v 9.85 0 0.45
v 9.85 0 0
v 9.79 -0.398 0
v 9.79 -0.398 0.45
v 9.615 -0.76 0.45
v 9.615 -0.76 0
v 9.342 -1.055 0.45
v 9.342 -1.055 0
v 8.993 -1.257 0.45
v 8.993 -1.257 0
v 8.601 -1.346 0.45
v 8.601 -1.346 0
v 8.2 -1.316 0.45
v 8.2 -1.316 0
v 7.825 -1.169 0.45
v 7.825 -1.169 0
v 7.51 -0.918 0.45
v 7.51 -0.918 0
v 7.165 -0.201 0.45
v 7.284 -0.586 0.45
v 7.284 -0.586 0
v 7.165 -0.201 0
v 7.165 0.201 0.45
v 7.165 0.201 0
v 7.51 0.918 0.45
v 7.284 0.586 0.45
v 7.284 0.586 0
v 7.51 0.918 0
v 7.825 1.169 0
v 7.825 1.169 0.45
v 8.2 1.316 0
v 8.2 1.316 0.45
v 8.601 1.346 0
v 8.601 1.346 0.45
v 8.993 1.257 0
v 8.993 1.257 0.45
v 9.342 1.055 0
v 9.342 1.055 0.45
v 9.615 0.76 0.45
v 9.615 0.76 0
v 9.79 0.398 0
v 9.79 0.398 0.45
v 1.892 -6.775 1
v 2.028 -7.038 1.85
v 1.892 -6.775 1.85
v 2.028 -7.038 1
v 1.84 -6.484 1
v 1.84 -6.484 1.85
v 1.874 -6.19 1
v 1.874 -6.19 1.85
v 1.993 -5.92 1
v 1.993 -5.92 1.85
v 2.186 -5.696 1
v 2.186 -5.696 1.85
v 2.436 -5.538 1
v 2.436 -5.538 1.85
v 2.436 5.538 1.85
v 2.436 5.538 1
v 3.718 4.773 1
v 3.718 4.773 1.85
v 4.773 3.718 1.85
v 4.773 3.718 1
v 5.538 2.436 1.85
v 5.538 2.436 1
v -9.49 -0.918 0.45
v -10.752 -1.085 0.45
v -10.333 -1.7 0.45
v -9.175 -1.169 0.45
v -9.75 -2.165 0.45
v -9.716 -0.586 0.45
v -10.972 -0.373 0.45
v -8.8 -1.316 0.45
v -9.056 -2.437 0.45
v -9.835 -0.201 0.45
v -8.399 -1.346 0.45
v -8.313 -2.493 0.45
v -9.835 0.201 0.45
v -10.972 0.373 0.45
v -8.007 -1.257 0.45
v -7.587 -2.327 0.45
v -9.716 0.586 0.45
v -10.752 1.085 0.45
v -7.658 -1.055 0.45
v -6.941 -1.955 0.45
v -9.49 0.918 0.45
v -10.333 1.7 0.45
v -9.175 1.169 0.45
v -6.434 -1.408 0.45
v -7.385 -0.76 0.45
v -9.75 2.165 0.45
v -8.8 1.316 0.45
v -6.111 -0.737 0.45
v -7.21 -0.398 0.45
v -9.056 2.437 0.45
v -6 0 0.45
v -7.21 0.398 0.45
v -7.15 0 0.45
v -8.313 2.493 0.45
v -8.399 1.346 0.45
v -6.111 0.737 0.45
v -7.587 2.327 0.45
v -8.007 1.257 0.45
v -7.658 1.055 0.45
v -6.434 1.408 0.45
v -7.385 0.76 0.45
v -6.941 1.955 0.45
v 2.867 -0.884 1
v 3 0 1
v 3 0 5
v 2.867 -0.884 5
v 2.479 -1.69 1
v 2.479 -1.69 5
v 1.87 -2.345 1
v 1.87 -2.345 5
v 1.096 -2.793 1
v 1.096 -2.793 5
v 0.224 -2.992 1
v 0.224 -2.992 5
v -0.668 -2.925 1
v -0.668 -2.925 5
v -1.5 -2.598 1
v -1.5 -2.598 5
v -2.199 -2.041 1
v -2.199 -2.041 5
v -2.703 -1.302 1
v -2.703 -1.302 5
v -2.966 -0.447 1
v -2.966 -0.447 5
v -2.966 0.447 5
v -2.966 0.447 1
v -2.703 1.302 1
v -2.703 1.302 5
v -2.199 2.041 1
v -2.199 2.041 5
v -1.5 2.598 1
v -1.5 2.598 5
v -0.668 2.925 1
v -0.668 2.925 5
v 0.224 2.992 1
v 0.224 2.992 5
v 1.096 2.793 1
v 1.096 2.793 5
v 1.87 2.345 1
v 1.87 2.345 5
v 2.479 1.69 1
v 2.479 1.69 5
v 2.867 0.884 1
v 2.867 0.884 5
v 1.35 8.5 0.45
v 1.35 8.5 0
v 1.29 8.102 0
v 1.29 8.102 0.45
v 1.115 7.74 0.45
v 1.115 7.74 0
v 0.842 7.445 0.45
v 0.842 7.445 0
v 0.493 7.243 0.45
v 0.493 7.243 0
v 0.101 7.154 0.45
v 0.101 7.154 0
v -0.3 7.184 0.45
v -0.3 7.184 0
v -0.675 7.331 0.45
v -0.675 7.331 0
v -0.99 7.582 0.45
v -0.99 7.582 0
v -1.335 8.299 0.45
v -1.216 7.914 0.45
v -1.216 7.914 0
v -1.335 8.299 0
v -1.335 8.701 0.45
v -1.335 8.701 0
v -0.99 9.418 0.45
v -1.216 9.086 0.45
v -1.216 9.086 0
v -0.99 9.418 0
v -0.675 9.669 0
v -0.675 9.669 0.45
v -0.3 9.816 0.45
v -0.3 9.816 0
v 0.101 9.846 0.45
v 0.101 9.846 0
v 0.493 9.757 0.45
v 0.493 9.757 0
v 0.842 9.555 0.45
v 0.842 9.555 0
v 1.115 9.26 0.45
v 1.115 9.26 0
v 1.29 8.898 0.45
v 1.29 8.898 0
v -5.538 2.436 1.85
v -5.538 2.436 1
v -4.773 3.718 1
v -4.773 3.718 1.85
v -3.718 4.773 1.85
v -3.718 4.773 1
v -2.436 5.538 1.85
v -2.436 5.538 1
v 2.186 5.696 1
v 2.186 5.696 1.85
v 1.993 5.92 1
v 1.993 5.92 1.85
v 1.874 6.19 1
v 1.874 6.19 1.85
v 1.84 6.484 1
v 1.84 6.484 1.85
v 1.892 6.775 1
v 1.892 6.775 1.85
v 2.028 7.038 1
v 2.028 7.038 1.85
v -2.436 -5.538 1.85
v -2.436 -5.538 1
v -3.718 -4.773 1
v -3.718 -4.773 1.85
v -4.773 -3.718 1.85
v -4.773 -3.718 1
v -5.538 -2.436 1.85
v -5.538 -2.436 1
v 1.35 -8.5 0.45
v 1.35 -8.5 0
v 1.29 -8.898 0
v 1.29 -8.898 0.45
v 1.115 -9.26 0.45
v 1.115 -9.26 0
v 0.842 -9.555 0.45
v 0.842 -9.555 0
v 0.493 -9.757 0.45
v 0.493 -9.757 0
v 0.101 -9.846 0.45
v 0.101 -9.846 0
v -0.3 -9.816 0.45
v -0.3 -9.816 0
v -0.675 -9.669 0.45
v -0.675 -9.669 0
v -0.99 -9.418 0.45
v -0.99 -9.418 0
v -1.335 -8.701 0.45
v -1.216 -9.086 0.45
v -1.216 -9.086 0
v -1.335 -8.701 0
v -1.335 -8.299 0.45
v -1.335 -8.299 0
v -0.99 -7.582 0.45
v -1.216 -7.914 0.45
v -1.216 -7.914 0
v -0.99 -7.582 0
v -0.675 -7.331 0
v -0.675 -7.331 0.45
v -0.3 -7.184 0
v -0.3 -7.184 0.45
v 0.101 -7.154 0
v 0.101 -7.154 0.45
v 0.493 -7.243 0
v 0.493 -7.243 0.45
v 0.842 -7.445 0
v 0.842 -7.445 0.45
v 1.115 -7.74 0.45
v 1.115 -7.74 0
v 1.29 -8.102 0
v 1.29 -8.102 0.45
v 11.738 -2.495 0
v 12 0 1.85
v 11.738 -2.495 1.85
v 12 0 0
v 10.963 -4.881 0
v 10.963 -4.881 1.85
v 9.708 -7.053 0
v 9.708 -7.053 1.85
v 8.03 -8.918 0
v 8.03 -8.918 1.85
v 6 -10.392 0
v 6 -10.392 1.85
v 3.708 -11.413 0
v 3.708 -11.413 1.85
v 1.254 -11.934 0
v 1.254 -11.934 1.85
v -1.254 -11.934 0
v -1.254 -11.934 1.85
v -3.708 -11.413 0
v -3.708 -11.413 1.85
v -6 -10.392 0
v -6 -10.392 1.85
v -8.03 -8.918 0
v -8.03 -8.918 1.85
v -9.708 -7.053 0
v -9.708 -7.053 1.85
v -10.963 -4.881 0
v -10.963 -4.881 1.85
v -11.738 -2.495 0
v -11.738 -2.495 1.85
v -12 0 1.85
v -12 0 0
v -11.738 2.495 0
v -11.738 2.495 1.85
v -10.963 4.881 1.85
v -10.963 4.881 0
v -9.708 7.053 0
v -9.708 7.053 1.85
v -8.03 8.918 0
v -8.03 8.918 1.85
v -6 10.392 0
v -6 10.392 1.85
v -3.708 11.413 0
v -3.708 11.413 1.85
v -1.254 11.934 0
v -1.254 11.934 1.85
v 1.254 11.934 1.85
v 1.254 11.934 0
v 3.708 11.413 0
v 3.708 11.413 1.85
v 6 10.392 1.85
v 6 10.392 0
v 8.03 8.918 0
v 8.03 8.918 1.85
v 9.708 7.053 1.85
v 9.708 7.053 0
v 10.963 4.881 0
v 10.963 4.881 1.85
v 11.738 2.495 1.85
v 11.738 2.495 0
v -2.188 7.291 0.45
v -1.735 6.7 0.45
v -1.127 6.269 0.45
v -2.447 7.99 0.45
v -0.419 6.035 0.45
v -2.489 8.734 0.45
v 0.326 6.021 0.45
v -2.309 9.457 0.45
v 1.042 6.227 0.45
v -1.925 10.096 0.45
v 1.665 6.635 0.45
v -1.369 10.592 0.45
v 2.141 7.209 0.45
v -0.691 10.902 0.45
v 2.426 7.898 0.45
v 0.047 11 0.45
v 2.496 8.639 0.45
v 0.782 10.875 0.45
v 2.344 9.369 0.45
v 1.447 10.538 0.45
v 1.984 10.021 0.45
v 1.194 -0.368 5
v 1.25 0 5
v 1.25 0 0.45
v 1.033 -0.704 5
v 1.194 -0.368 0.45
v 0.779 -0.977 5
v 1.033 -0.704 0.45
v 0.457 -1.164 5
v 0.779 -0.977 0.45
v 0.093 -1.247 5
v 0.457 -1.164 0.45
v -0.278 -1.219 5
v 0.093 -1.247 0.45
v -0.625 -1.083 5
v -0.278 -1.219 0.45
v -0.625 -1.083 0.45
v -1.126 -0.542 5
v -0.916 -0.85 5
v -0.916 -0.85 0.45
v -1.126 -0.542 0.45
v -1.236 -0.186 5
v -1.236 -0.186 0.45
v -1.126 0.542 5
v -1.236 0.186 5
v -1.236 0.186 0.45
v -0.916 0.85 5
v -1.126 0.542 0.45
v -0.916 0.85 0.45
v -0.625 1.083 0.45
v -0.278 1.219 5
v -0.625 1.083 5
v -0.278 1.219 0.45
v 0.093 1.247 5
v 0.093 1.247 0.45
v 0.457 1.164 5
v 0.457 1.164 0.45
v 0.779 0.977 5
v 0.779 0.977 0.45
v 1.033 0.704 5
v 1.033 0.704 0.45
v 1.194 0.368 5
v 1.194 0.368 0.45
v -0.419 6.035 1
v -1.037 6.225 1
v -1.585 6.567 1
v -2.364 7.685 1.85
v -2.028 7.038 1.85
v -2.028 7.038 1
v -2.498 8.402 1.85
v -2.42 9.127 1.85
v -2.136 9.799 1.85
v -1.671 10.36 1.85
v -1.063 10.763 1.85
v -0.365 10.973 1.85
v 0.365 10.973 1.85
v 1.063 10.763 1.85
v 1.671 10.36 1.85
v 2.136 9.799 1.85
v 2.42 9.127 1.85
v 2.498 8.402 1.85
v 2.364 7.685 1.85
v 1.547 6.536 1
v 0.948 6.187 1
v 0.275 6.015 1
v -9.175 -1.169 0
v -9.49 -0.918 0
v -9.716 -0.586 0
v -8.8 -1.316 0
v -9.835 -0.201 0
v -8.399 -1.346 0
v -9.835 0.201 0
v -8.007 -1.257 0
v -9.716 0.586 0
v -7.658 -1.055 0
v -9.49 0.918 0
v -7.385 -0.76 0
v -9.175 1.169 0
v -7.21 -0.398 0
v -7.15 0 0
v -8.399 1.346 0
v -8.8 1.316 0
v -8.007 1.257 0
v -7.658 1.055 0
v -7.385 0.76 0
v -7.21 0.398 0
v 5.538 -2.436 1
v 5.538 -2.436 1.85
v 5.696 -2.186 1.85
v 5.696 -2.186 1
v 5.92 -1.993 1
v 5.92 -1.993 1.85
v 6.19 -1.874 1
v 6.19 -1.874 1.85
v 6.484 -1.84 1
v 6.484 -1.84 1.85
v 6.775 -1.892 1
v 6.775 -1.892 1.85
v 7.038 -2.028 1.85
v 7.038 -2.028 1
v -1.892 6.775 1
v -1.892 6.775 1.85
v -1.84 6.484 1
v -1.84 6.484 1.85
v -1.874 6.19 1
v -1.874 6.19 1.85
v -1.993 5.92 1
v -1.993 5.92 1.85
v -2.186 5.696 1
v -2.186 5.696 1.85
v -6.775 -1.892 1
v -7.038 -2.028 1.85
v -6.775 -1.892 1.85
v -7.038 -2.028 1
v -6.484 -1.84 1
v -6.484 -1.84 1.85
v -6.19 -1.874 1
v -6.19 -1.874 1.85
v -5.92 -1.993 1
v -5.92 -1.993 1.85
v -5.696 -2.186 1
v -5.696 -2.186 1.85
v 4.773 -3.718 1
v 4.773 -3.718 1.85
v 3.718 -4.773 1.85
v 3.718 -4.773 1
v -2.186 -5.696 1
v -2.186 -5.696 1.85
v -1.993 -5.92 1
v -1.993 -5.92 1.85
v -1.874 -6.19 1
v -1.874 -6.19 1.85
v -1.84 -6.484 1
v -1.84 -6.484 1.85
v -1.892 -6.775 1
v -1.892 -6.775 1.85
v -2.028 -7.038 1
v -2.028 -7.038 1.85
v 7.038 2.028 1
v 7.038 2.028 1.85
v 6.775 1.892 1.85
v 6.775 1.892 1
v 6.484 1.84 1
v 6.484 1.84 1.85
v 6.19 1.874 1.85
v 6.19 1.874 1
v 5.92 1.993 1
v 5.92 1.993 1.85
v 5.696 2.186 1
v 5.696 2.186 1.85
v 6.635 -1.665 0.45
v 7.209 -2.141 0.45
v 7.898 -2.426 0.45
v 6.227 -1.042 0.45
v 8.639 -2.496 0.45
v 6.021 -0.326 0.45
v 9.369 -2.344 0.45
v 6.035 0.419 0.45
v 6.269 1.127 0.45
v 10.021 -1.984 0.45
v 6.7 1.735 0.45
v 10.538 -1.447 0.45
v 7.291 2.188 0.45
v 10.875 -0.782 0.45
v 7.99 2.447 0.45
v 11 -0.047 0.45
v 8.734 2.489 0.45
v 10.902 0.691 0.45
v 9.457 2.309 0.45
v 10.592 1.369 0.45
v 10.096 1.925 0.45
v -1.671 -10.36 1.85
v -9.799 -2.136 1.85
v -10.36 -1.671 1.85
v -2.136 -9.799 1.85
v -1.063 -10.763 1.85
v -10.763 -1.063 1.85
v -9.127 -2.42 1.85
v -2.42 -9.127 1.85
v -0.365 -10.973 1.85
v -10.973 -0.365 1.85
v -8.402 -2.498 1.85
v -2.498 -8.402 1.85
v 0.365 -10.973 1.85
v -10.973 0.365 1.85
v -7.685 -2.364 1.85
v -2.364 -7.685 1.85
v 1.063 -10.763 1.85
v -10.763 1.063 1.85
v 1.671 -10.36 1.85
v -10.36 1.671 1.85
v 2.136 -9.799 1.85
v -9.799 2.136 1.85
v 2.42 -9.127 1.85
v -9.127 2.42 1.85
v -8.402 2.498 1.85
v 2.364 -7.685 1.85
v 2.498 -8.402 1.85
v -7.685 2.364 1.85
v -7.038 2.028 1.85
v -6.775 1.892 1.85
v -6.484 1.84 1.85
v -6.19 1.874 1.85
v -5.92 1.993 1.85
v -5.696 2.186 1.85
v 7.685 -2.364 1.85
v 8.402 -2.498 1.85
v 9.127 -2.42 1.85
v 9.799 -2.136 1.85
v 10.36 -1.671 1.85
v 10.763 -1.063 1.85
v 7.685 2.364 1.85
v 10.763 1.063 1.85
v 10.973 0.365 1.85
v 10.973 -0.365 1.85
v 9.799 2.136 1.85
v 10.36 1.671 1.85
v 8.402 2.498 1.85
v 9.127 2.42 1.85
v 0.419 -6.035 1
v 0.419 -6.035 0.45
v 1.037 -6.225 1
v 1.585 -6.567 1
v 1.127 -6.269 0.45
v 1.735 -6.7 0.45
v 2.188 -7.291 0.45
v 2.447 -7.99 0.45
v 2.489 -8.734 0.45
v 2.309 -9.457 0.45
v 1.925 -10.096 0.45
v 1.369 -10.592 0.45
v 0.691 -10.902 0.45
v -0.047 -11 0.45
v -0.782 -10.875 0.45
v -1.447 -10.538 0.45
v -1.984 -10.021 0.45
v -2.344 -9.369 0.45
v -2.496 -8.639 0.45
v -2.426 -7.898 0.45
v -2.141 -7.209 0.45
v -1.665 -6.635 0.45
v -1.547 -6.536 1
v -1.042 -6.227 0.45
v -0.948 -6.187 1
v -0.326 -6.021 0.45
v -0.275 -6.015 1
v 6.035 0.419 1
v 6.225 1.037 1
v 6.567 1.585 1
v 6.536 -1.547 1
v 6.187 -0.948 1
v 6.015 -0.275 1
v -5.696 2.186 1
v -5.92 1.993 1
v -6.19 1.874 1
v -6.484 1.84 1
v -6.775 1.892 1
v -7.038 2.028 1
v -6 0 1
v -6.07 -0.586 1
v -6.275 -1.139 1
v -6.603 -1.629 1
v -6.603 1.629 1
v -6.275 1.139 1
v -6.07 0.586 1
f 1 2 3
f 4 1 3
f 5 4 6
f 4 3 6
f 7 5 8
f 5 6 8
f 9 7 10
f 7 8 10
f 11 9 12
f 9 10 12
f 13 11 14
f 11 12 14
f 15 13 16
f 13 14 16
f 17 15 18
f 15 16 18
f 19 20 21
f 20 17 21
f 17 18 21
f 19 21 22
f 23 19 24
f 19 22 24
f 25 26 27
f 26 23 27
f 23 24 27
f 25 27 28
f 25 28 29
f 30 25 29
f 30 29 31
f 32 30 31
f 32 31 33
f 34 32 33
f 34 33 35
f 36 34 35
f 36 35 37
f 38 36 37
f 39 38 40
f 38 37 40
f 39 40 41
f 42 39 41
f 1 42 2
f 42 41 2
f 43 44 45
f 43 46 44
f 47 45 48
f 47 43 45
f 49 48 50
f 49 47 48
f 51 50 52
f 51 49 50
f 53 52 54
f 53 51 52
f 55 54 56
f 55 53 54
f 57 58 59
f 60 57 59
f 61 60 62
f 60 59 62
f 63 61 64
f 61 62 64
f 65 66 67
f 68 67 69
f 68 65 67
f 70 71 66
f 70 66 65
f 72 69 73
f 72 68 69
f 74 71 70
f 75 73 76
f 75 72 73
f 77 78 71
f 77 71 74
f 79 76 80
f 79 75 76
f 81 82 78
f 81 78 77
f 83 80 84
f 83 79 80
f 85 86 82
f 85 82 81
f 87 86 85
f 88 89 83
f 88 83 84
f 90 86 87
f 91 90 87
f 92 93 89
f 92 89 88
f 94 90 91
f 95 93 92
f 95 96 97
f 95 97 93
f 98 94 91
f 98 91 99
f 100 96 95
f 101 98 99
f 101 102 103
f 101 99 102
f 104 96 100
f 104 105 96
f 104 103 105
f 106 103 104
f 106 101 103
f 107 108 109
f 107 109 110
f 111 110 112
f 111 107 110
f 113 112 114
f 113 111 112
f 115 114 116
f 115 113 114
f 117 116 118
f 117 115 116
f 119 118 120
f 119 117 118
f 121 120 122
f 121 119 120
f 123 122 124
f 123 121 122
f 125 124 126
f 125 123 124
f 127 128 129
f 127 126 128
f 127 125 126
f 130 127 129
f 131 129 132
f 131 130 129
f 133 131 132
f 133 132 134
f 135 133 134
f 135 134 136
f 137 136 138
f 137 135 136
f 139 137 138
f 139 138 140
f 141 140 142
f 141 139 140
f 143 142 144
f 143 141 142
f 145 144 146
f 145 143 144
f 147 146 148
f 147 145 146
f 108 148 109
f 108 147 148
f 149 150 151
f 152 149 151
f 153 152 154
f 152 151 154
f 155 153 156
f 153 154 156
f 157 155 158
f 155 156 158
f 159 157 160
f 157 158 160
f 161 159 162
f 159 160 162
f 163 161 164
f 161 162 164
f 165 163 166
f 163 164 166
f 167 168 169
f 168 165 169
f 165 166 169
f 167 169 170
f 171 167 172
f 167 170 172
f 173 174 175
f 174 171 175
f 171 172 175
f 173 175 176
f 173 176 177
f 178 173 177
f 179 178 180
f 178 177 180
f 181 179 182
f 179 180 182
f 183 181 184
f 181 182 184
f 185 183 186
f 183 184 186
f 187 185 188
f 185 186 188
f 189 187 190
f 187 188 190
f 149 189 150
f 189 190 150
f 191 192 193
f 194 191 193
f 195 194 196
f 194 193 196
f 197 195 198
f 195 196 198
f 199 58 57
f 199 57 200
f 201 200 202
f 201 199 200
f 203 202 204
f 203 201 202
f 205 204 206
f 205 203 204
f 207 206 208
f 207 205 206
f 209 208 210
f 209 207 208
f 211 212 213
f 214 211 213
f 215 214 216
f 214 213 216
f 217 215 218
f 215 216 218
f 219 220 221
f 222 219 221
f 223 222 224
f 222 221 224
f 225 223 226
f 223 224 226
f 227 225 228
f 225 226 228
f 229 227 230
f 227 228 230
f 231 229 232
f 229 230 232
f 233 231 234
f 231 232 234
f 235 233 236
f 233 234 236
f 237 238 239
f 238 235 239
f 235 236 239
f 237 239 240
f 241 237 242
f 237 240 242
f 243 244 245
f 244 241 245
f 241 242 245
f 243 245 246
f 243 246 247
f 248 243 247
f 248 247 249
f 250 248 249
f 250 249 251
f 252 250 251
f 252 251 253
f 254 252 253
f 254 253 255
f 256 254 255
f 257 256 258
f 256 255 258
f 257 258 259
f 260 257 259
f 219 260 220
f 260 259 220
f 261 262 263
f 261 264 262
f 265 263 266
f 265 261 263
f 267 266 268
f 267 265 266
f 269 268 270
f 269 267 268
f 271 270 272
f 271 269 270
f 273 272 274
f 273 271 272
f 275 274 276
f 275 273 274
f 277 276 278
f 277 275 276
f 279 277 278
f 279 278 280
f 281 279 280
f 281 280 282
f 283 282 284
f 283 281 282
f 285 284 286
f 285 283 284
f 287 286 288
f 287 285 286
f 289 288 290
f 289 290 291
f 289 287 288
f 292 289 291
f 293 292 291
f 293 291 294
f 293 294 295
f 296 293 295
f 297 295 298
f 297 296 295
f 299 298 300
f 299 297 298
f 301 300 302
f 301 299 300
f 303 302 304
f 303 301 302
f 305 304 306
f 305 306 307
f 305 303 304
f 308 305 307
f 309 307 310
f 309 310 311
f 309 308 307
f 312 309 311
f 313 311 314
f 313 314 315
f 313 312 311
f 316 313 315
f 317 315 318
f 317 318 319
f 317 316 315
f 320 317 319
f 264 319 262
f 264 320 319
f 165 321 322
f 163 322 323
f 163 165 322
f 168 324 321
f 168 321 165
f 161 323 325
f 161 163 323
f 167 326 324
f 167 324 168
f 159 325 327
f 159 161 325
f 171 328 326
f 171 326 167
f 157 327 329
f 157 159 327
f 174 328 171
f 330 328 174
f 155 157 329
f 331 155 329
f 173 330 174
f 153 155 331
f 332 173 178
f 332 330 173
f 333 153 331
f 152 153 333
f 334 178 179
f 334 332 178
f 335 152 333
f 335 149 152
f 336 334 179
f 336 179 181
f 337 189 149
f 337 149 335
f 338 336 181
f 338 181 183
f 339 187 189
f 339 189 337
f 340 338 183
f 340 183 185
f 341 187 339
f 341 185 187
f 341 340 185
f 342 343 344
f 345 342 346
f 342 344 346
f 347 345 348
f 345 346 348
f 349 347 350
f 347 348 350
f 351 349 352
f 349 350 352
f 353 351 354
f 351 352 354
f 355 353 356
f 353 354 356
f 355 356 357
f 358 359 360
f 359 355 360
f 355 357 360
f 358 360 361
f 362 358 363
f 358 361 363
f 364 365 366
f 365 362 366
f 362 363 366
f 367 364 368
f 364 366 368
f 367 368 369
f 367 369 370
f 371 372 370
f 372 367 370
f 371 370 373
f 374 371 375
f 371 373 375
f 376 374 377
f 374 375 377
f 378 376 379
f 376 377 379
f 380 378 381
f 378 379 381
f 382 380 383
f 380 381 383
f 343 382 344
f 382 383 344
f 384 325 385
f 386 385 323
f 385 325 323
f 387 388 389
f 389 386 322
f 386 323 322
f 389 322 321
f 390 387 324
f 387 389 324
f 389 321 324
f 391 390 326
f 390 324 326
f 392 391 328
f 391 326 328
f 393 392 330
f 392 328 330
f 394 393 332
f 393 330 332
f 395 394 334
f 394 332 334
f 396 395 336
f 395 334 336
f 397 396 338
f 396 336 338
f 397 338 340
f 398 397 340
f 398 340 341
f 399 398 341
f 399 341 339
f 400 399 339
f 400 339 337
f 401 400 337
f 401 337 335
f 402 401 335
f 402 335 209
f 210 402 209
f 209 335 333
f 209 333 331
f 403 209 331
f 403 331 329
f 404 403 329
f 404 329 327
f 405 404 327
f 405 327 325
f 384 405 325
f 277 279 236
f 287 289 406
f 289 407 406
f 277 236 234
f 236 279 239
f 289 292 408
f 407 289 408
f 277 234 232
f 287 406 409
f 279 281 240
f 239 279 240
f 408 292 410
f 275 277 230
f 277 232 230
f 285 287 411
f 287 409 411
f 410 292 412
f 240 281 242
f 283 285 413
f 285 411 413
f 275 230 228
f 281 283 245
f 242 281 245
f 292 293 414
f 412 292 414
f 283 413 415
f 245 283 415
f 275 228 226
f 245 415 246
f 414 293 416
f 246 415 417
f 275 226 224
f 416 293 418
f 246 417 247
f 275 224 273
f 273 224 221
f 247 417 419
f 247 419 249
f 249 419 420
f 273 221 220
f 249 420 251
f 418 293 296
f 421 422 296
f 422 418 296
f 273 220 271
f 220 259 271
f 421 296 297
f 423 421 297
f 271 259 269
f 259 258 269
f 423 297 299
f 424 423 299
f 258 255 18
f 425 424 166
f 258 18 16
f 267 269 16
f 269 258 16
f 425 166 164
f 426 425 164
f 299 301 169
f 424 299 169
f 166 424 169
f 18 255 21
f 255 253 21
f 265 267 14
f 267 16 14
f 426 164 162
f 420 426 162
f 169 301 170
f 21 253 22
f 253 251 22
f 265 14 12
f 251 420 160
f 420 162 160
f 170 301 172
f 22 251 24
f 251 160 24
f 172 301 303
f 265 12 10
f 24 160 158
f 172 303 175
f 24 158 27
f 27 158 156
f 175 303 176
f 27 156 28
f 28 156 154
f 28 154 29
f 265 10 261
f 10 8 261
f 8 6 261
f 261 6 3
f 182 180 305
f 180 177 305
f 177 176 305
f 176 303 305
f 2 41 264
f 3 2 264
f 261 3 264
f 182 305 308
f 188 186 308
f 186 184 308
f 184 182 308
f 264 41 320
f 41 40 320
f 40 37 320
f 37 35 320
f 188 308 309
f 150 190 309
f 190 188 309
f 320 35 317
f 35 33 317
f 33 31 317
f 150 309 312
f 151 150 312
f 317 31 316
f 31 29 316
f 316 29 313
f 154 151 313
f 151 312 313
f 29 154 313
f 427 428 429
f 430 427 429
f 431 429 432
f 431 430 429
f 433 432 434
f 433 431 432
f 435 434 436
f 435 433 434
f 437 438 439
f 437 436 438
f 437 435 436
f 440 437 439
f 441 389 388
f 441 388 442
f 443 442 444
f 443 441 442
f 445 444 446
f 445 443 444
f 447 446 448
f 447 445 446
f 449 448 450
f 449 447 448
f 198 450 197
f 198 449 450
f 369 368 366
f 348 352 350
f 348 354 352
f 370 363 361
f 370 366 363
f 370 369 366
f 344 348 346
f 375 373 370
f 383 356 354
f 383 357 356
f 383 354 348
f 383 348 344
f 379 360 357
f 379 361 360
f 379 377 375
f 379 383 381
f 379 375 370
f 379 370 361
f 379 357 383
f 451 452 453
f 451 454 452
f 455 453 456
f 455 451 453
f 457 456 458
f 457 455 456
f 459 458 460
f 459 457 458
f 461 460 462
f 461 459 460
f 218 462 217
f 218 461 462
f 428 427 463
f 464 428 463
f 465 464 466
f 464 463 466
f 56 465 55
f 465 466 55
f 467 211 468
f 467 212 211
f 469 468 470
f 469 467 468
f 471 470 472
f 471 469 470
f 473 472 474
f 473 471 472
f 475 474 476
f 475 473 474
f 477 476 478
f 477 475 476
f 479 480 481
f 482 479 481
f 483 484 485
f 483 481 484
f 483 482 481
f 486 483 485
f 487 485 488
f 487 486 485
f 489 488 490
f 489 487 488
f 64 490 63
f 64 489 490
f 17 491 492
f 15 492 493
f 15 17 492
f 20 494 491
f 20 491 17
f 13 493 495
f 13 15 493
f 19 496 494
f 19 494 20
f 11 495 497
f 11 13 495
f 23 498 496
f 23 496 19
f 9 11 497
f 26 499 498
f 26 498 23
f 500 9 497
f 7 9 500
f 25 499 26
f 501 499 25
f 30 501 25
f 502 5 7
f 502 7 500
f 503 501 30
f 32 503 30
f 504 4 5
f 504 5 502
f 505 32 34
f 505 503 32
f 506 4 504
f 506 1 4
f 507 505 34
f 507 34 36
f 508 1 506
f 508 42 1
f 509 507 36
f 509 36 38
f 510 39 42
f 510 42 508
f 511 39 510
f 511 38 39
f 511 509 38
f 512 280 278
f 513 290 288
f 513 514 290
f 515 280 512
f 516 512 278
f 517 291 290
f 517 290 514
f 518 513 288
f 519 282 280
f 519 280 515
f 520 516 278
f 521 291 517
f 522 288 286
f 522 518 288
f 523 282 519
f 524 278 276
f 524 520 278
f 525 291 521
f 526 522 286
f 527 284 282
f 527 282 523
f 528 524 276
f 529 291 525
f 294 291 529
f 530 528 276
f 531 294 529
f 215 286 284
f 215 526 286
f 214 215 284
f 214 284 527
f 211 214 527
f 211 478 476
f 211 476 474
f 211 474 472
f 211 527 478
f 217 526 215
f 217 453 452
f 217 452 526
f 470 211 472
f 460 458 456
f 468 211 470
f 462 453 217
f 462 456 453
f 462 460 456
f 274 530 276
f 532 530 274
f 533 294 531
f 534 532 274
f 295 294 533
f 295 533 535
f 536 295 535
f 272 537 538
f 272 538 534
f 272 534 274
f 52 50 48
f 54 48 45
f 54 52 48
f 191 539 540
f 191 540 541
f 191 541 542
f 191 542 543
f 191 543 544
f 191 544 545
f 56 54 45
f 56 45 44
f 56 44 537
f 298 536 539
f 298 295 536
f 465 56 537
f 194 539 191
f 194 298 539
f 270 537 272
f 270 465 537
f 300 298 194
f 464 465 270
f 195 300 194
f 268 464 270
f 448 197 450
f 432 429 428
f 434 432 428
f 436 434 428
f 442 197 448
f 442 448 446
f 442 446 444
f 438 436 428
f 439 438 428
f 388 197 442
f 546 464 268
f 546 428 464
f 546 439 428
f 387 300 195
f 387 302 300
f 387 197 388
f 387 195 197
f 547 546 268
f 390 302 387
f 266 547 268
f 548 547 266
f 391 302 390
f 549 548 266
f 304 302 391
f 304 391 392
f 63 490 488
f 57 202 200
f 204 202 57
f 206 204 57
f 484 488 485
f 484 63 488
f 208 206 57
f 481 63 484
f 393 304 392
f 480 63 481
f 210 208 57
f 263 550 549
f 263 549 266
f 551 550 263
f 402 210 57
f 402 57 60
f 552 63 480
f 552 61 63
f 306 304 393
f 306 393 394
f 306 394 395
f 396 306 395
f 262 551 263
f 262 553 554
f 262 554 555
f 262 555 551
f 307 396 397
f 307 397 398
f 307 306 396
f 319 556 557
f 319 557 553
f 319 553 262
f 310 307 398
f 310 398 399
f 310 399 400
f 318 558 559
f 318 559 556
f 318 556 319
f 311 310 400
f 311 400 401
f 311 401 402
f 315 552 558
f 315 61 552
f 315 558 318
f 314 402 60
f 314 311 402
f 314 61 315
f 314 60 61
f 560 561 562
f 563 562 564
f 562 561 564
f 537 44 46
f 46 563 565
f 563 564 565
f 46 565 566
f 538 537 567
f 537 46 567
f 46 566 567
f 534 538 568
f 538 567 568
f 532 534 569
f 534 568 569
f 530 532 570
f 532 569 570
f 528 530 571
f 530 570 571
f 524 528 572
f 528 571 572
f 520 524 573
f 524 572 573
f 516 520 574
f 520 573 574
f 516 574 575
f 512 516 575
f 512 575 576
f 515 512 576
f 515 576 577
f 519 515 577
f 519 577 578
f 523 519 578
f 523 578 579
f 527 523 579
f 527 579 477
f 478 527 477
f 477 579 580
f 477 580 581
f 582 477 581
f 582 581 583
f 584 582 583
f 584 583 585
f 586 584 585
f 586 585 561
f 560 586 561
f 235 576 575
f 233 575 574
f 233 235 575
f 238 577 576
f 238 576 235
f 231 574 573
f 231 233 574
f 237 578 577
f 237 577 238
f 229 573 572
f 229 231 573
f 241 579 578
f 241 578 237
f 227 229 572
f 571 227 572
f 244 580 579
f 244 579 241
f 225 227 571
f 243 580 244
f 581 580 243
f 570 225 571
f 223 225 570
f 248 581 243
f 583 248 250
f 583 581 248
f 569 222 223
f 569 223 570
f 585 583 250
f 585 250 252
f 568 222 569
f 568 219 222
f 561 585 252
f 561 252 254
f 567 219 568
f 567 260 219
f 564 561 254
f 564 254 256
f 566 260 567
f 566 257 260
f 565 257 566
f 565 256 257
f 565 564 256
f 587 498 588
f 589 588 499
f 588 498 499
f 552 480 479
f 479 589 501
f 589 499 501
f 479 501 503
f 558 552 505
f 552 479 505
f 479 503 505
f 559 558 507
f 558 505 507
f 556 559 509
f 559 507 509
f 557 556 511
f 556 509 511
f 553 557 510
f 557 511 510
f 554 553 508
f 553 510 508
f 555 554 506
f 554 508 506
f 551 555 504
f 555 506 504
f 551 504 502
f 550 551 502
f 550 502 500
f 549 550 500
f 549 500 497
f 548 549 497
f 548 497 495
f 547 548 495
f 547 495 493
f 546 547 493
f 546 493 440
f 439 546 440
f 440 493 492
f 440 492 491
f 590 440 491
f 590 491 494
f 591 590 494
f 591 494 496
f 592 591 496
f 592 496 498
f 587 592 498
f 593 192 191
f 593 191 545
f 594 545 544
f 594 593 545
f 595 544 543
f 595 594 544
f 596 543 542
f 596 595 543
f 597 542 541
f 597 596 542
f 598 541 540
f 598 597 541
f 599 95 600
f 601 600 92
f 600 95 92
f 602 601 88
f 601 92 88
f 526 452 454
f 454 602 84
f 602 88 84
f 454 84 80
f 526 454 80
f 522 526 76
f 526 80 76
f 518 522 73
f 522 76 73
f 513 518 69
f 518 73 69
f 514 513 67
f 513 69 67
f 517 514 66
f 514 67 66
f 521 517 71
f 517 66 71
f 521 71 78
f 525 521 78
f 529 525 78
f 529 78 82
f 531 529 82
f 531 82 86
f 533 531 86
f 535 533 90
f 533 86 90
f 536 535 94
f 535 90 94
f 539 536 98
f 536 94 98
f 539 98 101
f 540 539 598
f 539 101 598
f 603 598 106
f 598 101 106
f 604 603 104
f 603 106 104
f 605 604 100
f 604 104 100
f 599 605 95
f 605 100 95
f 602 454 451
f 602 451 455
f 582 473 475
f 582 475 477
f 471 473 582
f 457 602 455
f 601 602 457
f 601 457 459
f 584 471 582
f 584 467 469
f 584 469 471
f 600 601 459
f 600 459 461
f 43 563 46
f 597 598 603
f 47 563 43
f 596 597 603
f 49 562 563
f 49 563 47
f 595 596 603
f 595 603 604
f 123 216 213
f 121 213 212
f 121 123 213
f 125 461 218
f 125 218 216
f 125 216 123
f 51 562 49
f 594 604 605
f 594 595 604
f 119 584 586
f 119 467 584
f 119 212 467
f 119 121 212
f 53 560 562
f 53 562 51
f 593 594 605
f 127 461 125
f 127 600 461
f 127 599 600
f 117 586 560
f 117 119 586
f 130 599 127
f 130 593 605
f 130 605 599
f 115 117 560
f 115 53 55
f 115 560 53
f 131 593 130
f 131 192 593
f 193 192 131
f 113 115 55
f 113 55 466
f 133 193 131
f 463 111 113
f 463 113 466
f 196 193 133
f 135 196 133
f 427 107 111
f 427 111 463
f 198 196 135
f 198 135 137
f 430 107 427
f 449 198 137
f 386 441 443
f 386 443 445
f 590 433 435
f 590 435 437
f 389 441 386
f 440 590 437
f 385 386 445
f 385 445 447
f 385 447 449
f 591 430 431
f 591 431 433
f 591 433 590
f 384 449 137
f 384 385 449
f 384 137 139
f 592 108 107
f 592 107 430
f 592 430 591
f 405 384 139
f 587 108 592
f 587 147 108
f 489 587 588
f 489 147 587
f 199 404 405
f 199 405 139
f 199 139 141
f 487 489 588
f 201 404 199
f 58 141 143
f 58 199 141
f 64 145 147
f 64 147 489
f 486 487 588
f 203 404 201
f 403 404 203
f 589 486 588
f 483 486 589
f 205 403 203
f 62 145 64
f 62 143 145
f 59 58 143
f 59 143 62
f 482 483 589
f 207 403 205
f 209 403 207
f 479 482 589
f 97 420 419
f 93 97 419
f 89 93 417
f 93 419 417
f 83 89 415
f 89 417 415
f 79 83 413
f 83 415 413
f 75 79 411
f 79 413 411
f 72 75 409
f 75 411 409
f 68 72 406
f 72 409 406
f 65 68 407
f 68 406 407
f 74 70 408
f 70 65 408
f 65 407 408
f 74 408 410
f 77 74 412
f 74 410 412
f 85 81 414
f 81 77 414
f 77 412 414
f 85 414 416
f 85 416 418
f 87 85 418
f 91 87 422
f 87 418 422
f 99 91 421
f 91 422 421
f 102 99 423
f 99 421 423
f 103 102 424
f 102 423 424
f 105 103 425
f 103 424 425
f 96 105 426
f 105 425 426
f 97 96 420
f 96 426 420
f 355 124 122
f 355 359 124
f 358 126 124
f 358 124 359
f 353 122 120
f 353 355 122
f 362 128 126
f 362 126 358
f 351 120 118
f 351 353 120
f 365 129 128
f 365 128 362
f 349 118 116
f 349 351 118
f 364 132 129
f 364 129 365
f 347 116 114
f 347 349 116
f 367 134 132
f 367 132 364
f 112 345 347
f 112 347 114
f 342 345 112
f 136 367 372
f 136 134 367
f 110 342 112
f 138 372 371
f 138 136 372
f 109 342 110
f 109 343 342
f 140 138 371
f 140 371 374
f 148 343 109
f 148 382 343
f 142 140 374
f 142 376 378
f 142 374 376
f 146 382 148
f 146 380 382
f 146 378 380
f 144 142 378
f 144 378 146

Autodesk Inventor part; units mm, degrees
ref_plane "YZ Plane" through (0, 0, 0) normal (1, 0, 0) x (0, 1, 0)
ref_plane "XZ Plane" through (0, 0, 0) normal (0, 1, 0) x (-1, 0, 0)
ref_plane "XY Plane" through (0, 0, 0) normal (0, 0, 1) x (1, 0, 0)
sketch "スケッチ1" plane through (0, 0, 0) normal (0, 0, 1) x (1, 0, 0)
  circle A0 centre (0, 8.5) radius 1.35
  circle A1 centre (0, 0) radius 1.25
  circle A2 centre (0, 0) radius 3
  circle A3 centre (0, 0) radius 6.05
  circle A4 centre (0, 8.5) radius 2.5
  circle A5 centre (-8.5, 0) radius 1.35
  circle A6 centre (-8.5, 0) radius 2.5
  circle A7 centre (0, -8.5) radius 1.35
  circle A8 centre (0, -8.5) radius 2.5
  circle A9 centre (8.5, 0) radius 1.35
  circle A10 centre (8.5, 0) radius 2.5
  circle A11 centre (0, 0) radius 6 construction
  circle A12 centre (0, 0) radius 12
  point P0 (6.0354, -0.4195)
  point P1 (6.0354, 0.4195)
  point P2 (0.4195, 6.0354)
  point P3 (-0.4195, 6.0354)
  point P4 (-6.0354, 0.4195)
  point P5 (-6.0354, -0.4195)
  point P6 (-0.4195, -6.0354)
  point P7 (0.4195, -6.0354)
  dimension "d0" = 2.7
  dimension "d1" = 8.5
  dimension "d3" = 2.5
  dimension "d33" = 6
  dimension "d55" = 12.1
  dimension "d58" = 5
  dimension "d61" = 360
  dimension "d66" = 12
  dimension "d71" = 24
extrude "押し出し1" add sketch "スケッチ1" along normal blind 5 contours A2
extrude "押し出し2" add sketch "スケッチ1" along normal blind 0.45 contours A1 | A2 | A3 A10 | A3 A10 | A4 A3 | A3 A4 | A8 A3 | A3 A8 | A6 A3 | A3 A6
extrude "押し出し3" add sketch "スケッチ1" along normal blind 1.85 contours A12
extrude "押し出し4" add sketch "スケッチ1" along normal blind 1 contours A10 A3 A8 A6 A4
fillet "フィレット2" radius 1 8 edges at (-6.0354, -0.4195, 1.425) (-6.0354, 0.4195, 1.425) (0.4195, -6.0354, 1.425) (-0.4195, -6.0354, 1.425) (6.0354, 0.4195, 1.425) (6.0354, -0.4195, 1.425) (0.4195, 6.0354, 1.425) (-0.4195, 6.0354, 1.425)
properties part number "足首_独立ピッチ_1_2" material "アルミニウム 2014-T4"
